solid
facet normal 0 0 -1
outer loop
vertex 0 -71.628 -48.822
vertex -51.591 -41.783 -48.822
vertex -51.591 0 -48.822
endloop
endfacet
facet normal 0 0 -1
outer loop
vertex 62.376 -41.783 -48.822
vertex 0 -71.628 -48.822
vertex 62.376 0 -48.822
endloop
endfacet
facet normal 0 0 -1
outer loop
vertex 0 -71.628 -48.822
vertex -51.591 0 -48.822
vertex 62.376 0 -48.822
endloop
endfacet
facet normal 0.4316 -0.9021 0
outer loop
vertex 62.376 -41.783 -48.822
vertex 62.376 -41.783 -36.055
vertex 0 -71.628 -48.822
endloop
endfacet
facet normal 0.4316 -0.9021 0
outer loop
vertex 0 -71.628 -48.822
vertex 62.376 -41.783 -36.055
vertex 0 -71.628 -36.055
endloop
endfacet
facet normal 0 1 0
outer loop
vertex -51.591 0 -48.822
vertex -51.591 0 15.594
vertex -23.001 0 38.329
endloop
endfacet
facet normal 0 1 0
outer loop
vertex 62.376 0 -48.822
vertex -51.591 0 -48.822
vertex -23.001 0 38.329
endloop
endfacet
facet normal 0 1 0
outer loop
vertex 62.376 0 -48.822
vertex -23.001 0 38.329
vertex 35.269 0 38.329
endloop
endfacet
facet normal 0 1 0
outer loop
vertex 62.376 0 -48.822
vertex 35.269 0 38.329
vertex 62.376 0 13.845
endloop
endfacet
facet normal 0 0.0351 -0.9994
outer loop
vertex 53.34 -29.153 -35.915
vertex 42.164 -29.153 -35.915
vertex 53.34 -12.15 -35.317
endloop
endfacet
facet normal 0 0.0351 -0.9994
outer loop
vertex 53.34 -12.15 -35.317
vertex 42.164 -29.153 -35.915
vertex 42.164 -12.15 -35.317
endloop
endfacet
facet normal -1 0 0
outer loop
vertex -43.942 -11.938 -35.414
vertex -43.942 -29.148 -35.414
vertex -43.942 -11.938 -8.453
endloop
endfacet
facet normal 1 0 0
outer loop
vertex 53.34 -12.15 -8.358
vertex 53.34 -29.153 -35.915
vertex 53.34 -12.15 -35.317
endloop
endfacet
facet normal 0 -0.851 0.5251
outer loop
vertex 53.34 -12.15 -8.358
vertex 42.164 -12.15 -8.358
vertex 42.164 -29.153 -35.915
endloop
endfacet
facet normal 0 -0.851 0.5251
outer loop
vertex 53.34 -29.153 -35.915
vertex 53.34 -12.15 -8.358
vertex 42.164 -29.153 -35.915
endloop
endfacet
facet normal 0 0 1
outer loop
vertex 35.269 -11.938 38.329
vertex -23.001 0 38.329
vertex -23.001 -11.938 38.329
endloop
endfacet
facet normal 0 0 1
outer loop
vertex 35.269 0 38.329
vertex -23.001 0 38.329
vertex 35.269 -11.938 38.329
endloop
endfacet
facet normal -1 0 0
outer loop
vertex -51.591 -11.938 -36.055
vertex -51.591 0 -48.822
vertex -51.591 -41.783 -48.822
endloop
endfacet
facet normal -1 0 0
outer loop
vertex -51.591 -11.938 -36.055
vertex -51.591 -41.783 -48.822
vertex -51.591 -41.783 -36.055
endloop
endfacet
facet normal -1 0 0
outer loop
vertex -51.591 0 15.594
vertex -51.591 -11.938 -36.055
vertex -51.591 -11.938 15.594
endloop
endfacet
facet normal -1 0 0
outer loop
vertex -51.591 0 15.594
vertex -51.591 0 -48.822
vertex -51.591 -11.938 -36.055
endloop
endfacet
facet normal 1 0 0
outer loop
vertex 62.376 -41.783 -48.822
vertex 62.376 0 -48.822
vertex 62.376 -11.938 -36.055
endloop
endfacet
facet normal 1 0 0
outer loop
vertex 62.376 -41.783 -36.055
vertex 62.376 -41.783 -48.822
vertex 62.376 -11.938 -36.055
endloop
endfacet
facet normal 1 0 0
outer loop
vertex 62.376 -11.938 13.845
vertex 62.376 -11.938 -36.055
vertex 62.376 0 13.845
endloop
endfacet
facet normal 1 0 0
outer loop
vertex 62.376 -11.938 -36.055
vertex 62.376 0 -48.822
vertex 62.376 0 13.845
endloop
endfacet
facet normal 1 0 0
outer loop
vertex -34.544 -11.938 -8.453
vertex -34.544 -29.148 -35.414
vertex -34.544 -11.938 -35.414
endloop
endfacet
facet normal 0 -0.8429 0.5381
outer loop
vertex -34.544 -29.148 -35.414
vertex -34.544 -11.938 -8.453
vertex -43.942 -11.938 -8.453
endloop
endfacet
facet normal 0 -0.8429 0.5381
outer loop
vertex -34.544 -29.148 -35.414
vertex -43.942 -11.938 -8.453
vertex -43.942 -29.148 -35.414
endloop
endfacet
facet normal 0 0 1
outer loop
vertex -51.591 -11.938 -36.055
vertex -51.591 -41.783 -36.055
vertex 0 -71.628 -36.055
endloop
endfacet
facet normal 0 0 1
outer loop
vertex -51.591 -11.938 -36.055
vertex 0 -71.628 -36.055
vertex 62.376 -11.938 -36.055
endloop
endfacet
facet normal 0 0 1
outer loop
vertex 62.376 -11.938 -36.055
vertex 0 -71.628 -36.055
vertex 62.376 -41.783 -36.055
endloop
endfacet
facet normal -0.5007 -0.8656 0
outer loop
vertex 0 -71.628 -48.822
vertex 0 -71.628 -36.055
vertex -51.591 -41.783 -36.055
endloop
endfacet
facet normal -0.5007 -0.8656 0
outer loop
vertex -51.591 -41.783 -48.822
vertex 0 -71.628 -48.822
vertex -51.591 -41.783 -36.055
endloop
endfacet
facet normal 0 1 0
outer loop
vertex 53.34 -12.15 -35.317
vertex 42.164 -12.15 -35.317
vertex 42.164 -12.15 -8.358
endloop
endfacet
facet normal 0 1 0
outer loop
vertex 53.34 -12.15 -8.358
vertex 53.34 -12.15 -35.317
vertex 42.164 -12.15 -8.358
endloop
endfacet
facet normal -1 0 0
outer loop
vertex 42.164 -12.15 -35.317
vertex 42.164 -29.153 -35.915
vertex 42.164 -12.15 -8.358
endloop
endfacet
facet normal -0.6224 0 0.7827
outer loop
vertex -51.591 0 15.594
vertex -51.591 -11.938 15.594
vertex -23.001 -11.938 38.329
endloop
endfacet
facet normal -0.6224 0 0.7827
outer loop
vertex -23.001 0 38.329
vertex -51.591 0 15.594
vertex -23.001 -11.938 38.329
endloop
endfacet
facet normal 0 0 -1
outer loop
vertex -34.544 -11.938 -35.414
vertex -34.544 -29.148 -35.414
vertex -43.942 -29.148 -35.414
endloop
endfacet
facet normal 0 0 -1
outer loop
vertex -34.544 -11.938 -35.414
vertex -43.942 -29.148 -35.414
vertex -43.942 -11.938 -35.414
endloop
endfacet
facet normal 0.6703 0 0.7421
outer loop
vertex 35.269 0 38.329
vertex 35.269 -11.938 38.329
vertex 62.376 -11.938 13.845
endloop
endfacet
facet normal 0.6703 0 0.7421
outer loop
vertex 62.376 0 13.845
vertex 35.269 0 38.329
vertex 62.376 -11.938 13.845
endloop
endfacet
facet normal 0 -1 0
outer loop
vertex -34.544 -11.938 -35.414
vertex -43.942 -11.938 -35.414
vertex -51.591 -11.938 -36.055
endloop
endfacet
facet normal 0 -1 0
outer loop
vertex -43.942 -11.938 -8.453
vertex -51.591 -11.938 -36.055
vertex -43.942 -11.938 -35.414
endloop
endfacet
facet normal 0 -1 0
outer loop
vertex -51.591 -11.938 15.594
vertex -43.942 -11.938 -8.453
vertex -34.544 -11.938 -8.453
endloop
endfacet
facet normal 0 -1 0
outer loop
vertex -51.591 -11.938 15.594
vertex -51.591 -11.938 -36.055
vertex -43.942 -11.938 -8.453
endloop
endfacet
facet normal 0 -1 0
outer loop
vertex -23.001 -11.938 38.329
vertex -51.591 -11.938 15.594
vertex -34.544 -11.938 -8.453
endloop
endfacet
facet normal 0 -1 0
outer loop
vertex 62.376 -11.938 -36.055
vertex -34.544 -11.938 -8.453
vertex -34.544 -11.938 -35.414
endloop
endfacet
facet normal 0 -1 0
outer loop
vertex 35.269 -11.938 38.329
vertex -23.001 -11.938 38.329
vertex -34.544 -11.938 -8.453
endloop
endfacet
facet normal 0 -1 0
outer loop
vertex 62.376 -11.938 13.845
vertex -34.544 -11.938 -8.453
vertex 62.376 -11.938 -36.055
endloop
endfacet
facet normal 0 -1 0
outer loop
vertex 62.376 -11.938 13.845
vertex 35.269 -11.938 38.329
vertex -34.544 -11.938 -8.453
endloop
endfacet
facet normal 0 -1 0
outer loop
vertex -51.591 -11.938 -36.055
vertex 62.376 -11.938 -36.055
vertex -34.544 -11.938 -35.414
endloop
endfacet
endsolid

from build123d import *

# Parameters (mm, degrees)
F0_W      = 113.9668896794
F0_H      = 87.1511474252
F1_DEPTH  = 71.628
F2_W      = 113.9668896794
F2_H      = 74.3841528893
F3_DEPTH  = 59.69
F5_DEPTH  = 25.4
F7_DEPTH  = 25.4
F9_DEPTH  = 53.34
F10_DEPTH = 42.164
F12_DEPTH = 43.942
F13_DEPTH = 34.544


with BuildPart() as f1:
    # F0 (on Front) → F1 (new body)
    with BuildSketch(Plane.XZ):
        with Locations((5.3922943771, -5.2465572953)):
            Rectangle(F0_W, F0_H)
    extrude(amount=F1_DEPTH)

    # F2 (on face) → F3 (cut)
    with BuildSketch(Plane.XZ.offset(71.628)):
        with Locations((5.3922943771, 1.1369399726)):
            Rectangle(F2_W, F2_H)
    extrude(amount=-F3_DEPTH, mode=Mode.SUBTRACT)

    # F4 (on face) → F5 (cut)
    with BuildSketch(Plane.XZ.offset(11.938)):
        Polygon((-51.5911504626, 15.5939338729), (-23.0012916318, 38.3290164173), (-51.5911504626, 38.3290164173), align=None)
        Polygon((62.3757392168, 38.3290164173), (35.2685265243, 38.3290164173), (62.3757392168, 13.8450823724), align=None)
    extrude(amount=-F5_DEPTH, mode=Mode.SUBTRACT)

    # F6 (on face) → F7 (cut)
    with BuildSketch(Plane.XY.offset(-36.055136472)):
        Polygon((0, -71.628), (-51.5911504626, -41.783), (-51.5911504626, -71.628), align=None)
        Polygon((62.3757392168, -41.783), (0, -71.628), (62.3757392168, -71.628), align=None)
    extrude(amount=-F7_DEPTH, mode=Mode.SUBTRACT)

    # F11 (on Right) → F12 (join)
    with BuildSketch(Plane.YZ):
        Polygon((-11.6590159014, -8.0155739561), (-29.1475411505, -35.4142636061), (-11.6590159014, -35.4142636061), align=None)
    extrude(amount=-F12_DEPTH)

    # F13 (cut): a face of the model
    f13_faces = [f1.faces().sort_by_distance(p)[0] for p in [
        (0, -17.6745137168, -26.4270587525),
    ]]
    extrude(f13_faces, amount=-F13_DEPTH, mode=Mode.SUBTRACT)


with BuildPart() as f9:
    # F8 (on Right) → F9 (new body)
    with BuildSketch(Plane.YZ):
        Polygon((-29.1530136019, -35.9151102602), (-12.1495109051, -35.3167108349), (-12.1495109051, -8.3577046171), align=None)
    extrude(amount=F9_DEPTH)

    # F10 (cut): a face of the model
    f10_faces = [f9.faces().sort_by_distance(p)[0] for p in [
        (0, -17.8173451374, -26.5298419041),
    ]]
    extrude(f10_faces, amount=-F10_DEPTH, mode=Mode.SUBTRACT)


solid = Compound([f1.part, f9.part])
